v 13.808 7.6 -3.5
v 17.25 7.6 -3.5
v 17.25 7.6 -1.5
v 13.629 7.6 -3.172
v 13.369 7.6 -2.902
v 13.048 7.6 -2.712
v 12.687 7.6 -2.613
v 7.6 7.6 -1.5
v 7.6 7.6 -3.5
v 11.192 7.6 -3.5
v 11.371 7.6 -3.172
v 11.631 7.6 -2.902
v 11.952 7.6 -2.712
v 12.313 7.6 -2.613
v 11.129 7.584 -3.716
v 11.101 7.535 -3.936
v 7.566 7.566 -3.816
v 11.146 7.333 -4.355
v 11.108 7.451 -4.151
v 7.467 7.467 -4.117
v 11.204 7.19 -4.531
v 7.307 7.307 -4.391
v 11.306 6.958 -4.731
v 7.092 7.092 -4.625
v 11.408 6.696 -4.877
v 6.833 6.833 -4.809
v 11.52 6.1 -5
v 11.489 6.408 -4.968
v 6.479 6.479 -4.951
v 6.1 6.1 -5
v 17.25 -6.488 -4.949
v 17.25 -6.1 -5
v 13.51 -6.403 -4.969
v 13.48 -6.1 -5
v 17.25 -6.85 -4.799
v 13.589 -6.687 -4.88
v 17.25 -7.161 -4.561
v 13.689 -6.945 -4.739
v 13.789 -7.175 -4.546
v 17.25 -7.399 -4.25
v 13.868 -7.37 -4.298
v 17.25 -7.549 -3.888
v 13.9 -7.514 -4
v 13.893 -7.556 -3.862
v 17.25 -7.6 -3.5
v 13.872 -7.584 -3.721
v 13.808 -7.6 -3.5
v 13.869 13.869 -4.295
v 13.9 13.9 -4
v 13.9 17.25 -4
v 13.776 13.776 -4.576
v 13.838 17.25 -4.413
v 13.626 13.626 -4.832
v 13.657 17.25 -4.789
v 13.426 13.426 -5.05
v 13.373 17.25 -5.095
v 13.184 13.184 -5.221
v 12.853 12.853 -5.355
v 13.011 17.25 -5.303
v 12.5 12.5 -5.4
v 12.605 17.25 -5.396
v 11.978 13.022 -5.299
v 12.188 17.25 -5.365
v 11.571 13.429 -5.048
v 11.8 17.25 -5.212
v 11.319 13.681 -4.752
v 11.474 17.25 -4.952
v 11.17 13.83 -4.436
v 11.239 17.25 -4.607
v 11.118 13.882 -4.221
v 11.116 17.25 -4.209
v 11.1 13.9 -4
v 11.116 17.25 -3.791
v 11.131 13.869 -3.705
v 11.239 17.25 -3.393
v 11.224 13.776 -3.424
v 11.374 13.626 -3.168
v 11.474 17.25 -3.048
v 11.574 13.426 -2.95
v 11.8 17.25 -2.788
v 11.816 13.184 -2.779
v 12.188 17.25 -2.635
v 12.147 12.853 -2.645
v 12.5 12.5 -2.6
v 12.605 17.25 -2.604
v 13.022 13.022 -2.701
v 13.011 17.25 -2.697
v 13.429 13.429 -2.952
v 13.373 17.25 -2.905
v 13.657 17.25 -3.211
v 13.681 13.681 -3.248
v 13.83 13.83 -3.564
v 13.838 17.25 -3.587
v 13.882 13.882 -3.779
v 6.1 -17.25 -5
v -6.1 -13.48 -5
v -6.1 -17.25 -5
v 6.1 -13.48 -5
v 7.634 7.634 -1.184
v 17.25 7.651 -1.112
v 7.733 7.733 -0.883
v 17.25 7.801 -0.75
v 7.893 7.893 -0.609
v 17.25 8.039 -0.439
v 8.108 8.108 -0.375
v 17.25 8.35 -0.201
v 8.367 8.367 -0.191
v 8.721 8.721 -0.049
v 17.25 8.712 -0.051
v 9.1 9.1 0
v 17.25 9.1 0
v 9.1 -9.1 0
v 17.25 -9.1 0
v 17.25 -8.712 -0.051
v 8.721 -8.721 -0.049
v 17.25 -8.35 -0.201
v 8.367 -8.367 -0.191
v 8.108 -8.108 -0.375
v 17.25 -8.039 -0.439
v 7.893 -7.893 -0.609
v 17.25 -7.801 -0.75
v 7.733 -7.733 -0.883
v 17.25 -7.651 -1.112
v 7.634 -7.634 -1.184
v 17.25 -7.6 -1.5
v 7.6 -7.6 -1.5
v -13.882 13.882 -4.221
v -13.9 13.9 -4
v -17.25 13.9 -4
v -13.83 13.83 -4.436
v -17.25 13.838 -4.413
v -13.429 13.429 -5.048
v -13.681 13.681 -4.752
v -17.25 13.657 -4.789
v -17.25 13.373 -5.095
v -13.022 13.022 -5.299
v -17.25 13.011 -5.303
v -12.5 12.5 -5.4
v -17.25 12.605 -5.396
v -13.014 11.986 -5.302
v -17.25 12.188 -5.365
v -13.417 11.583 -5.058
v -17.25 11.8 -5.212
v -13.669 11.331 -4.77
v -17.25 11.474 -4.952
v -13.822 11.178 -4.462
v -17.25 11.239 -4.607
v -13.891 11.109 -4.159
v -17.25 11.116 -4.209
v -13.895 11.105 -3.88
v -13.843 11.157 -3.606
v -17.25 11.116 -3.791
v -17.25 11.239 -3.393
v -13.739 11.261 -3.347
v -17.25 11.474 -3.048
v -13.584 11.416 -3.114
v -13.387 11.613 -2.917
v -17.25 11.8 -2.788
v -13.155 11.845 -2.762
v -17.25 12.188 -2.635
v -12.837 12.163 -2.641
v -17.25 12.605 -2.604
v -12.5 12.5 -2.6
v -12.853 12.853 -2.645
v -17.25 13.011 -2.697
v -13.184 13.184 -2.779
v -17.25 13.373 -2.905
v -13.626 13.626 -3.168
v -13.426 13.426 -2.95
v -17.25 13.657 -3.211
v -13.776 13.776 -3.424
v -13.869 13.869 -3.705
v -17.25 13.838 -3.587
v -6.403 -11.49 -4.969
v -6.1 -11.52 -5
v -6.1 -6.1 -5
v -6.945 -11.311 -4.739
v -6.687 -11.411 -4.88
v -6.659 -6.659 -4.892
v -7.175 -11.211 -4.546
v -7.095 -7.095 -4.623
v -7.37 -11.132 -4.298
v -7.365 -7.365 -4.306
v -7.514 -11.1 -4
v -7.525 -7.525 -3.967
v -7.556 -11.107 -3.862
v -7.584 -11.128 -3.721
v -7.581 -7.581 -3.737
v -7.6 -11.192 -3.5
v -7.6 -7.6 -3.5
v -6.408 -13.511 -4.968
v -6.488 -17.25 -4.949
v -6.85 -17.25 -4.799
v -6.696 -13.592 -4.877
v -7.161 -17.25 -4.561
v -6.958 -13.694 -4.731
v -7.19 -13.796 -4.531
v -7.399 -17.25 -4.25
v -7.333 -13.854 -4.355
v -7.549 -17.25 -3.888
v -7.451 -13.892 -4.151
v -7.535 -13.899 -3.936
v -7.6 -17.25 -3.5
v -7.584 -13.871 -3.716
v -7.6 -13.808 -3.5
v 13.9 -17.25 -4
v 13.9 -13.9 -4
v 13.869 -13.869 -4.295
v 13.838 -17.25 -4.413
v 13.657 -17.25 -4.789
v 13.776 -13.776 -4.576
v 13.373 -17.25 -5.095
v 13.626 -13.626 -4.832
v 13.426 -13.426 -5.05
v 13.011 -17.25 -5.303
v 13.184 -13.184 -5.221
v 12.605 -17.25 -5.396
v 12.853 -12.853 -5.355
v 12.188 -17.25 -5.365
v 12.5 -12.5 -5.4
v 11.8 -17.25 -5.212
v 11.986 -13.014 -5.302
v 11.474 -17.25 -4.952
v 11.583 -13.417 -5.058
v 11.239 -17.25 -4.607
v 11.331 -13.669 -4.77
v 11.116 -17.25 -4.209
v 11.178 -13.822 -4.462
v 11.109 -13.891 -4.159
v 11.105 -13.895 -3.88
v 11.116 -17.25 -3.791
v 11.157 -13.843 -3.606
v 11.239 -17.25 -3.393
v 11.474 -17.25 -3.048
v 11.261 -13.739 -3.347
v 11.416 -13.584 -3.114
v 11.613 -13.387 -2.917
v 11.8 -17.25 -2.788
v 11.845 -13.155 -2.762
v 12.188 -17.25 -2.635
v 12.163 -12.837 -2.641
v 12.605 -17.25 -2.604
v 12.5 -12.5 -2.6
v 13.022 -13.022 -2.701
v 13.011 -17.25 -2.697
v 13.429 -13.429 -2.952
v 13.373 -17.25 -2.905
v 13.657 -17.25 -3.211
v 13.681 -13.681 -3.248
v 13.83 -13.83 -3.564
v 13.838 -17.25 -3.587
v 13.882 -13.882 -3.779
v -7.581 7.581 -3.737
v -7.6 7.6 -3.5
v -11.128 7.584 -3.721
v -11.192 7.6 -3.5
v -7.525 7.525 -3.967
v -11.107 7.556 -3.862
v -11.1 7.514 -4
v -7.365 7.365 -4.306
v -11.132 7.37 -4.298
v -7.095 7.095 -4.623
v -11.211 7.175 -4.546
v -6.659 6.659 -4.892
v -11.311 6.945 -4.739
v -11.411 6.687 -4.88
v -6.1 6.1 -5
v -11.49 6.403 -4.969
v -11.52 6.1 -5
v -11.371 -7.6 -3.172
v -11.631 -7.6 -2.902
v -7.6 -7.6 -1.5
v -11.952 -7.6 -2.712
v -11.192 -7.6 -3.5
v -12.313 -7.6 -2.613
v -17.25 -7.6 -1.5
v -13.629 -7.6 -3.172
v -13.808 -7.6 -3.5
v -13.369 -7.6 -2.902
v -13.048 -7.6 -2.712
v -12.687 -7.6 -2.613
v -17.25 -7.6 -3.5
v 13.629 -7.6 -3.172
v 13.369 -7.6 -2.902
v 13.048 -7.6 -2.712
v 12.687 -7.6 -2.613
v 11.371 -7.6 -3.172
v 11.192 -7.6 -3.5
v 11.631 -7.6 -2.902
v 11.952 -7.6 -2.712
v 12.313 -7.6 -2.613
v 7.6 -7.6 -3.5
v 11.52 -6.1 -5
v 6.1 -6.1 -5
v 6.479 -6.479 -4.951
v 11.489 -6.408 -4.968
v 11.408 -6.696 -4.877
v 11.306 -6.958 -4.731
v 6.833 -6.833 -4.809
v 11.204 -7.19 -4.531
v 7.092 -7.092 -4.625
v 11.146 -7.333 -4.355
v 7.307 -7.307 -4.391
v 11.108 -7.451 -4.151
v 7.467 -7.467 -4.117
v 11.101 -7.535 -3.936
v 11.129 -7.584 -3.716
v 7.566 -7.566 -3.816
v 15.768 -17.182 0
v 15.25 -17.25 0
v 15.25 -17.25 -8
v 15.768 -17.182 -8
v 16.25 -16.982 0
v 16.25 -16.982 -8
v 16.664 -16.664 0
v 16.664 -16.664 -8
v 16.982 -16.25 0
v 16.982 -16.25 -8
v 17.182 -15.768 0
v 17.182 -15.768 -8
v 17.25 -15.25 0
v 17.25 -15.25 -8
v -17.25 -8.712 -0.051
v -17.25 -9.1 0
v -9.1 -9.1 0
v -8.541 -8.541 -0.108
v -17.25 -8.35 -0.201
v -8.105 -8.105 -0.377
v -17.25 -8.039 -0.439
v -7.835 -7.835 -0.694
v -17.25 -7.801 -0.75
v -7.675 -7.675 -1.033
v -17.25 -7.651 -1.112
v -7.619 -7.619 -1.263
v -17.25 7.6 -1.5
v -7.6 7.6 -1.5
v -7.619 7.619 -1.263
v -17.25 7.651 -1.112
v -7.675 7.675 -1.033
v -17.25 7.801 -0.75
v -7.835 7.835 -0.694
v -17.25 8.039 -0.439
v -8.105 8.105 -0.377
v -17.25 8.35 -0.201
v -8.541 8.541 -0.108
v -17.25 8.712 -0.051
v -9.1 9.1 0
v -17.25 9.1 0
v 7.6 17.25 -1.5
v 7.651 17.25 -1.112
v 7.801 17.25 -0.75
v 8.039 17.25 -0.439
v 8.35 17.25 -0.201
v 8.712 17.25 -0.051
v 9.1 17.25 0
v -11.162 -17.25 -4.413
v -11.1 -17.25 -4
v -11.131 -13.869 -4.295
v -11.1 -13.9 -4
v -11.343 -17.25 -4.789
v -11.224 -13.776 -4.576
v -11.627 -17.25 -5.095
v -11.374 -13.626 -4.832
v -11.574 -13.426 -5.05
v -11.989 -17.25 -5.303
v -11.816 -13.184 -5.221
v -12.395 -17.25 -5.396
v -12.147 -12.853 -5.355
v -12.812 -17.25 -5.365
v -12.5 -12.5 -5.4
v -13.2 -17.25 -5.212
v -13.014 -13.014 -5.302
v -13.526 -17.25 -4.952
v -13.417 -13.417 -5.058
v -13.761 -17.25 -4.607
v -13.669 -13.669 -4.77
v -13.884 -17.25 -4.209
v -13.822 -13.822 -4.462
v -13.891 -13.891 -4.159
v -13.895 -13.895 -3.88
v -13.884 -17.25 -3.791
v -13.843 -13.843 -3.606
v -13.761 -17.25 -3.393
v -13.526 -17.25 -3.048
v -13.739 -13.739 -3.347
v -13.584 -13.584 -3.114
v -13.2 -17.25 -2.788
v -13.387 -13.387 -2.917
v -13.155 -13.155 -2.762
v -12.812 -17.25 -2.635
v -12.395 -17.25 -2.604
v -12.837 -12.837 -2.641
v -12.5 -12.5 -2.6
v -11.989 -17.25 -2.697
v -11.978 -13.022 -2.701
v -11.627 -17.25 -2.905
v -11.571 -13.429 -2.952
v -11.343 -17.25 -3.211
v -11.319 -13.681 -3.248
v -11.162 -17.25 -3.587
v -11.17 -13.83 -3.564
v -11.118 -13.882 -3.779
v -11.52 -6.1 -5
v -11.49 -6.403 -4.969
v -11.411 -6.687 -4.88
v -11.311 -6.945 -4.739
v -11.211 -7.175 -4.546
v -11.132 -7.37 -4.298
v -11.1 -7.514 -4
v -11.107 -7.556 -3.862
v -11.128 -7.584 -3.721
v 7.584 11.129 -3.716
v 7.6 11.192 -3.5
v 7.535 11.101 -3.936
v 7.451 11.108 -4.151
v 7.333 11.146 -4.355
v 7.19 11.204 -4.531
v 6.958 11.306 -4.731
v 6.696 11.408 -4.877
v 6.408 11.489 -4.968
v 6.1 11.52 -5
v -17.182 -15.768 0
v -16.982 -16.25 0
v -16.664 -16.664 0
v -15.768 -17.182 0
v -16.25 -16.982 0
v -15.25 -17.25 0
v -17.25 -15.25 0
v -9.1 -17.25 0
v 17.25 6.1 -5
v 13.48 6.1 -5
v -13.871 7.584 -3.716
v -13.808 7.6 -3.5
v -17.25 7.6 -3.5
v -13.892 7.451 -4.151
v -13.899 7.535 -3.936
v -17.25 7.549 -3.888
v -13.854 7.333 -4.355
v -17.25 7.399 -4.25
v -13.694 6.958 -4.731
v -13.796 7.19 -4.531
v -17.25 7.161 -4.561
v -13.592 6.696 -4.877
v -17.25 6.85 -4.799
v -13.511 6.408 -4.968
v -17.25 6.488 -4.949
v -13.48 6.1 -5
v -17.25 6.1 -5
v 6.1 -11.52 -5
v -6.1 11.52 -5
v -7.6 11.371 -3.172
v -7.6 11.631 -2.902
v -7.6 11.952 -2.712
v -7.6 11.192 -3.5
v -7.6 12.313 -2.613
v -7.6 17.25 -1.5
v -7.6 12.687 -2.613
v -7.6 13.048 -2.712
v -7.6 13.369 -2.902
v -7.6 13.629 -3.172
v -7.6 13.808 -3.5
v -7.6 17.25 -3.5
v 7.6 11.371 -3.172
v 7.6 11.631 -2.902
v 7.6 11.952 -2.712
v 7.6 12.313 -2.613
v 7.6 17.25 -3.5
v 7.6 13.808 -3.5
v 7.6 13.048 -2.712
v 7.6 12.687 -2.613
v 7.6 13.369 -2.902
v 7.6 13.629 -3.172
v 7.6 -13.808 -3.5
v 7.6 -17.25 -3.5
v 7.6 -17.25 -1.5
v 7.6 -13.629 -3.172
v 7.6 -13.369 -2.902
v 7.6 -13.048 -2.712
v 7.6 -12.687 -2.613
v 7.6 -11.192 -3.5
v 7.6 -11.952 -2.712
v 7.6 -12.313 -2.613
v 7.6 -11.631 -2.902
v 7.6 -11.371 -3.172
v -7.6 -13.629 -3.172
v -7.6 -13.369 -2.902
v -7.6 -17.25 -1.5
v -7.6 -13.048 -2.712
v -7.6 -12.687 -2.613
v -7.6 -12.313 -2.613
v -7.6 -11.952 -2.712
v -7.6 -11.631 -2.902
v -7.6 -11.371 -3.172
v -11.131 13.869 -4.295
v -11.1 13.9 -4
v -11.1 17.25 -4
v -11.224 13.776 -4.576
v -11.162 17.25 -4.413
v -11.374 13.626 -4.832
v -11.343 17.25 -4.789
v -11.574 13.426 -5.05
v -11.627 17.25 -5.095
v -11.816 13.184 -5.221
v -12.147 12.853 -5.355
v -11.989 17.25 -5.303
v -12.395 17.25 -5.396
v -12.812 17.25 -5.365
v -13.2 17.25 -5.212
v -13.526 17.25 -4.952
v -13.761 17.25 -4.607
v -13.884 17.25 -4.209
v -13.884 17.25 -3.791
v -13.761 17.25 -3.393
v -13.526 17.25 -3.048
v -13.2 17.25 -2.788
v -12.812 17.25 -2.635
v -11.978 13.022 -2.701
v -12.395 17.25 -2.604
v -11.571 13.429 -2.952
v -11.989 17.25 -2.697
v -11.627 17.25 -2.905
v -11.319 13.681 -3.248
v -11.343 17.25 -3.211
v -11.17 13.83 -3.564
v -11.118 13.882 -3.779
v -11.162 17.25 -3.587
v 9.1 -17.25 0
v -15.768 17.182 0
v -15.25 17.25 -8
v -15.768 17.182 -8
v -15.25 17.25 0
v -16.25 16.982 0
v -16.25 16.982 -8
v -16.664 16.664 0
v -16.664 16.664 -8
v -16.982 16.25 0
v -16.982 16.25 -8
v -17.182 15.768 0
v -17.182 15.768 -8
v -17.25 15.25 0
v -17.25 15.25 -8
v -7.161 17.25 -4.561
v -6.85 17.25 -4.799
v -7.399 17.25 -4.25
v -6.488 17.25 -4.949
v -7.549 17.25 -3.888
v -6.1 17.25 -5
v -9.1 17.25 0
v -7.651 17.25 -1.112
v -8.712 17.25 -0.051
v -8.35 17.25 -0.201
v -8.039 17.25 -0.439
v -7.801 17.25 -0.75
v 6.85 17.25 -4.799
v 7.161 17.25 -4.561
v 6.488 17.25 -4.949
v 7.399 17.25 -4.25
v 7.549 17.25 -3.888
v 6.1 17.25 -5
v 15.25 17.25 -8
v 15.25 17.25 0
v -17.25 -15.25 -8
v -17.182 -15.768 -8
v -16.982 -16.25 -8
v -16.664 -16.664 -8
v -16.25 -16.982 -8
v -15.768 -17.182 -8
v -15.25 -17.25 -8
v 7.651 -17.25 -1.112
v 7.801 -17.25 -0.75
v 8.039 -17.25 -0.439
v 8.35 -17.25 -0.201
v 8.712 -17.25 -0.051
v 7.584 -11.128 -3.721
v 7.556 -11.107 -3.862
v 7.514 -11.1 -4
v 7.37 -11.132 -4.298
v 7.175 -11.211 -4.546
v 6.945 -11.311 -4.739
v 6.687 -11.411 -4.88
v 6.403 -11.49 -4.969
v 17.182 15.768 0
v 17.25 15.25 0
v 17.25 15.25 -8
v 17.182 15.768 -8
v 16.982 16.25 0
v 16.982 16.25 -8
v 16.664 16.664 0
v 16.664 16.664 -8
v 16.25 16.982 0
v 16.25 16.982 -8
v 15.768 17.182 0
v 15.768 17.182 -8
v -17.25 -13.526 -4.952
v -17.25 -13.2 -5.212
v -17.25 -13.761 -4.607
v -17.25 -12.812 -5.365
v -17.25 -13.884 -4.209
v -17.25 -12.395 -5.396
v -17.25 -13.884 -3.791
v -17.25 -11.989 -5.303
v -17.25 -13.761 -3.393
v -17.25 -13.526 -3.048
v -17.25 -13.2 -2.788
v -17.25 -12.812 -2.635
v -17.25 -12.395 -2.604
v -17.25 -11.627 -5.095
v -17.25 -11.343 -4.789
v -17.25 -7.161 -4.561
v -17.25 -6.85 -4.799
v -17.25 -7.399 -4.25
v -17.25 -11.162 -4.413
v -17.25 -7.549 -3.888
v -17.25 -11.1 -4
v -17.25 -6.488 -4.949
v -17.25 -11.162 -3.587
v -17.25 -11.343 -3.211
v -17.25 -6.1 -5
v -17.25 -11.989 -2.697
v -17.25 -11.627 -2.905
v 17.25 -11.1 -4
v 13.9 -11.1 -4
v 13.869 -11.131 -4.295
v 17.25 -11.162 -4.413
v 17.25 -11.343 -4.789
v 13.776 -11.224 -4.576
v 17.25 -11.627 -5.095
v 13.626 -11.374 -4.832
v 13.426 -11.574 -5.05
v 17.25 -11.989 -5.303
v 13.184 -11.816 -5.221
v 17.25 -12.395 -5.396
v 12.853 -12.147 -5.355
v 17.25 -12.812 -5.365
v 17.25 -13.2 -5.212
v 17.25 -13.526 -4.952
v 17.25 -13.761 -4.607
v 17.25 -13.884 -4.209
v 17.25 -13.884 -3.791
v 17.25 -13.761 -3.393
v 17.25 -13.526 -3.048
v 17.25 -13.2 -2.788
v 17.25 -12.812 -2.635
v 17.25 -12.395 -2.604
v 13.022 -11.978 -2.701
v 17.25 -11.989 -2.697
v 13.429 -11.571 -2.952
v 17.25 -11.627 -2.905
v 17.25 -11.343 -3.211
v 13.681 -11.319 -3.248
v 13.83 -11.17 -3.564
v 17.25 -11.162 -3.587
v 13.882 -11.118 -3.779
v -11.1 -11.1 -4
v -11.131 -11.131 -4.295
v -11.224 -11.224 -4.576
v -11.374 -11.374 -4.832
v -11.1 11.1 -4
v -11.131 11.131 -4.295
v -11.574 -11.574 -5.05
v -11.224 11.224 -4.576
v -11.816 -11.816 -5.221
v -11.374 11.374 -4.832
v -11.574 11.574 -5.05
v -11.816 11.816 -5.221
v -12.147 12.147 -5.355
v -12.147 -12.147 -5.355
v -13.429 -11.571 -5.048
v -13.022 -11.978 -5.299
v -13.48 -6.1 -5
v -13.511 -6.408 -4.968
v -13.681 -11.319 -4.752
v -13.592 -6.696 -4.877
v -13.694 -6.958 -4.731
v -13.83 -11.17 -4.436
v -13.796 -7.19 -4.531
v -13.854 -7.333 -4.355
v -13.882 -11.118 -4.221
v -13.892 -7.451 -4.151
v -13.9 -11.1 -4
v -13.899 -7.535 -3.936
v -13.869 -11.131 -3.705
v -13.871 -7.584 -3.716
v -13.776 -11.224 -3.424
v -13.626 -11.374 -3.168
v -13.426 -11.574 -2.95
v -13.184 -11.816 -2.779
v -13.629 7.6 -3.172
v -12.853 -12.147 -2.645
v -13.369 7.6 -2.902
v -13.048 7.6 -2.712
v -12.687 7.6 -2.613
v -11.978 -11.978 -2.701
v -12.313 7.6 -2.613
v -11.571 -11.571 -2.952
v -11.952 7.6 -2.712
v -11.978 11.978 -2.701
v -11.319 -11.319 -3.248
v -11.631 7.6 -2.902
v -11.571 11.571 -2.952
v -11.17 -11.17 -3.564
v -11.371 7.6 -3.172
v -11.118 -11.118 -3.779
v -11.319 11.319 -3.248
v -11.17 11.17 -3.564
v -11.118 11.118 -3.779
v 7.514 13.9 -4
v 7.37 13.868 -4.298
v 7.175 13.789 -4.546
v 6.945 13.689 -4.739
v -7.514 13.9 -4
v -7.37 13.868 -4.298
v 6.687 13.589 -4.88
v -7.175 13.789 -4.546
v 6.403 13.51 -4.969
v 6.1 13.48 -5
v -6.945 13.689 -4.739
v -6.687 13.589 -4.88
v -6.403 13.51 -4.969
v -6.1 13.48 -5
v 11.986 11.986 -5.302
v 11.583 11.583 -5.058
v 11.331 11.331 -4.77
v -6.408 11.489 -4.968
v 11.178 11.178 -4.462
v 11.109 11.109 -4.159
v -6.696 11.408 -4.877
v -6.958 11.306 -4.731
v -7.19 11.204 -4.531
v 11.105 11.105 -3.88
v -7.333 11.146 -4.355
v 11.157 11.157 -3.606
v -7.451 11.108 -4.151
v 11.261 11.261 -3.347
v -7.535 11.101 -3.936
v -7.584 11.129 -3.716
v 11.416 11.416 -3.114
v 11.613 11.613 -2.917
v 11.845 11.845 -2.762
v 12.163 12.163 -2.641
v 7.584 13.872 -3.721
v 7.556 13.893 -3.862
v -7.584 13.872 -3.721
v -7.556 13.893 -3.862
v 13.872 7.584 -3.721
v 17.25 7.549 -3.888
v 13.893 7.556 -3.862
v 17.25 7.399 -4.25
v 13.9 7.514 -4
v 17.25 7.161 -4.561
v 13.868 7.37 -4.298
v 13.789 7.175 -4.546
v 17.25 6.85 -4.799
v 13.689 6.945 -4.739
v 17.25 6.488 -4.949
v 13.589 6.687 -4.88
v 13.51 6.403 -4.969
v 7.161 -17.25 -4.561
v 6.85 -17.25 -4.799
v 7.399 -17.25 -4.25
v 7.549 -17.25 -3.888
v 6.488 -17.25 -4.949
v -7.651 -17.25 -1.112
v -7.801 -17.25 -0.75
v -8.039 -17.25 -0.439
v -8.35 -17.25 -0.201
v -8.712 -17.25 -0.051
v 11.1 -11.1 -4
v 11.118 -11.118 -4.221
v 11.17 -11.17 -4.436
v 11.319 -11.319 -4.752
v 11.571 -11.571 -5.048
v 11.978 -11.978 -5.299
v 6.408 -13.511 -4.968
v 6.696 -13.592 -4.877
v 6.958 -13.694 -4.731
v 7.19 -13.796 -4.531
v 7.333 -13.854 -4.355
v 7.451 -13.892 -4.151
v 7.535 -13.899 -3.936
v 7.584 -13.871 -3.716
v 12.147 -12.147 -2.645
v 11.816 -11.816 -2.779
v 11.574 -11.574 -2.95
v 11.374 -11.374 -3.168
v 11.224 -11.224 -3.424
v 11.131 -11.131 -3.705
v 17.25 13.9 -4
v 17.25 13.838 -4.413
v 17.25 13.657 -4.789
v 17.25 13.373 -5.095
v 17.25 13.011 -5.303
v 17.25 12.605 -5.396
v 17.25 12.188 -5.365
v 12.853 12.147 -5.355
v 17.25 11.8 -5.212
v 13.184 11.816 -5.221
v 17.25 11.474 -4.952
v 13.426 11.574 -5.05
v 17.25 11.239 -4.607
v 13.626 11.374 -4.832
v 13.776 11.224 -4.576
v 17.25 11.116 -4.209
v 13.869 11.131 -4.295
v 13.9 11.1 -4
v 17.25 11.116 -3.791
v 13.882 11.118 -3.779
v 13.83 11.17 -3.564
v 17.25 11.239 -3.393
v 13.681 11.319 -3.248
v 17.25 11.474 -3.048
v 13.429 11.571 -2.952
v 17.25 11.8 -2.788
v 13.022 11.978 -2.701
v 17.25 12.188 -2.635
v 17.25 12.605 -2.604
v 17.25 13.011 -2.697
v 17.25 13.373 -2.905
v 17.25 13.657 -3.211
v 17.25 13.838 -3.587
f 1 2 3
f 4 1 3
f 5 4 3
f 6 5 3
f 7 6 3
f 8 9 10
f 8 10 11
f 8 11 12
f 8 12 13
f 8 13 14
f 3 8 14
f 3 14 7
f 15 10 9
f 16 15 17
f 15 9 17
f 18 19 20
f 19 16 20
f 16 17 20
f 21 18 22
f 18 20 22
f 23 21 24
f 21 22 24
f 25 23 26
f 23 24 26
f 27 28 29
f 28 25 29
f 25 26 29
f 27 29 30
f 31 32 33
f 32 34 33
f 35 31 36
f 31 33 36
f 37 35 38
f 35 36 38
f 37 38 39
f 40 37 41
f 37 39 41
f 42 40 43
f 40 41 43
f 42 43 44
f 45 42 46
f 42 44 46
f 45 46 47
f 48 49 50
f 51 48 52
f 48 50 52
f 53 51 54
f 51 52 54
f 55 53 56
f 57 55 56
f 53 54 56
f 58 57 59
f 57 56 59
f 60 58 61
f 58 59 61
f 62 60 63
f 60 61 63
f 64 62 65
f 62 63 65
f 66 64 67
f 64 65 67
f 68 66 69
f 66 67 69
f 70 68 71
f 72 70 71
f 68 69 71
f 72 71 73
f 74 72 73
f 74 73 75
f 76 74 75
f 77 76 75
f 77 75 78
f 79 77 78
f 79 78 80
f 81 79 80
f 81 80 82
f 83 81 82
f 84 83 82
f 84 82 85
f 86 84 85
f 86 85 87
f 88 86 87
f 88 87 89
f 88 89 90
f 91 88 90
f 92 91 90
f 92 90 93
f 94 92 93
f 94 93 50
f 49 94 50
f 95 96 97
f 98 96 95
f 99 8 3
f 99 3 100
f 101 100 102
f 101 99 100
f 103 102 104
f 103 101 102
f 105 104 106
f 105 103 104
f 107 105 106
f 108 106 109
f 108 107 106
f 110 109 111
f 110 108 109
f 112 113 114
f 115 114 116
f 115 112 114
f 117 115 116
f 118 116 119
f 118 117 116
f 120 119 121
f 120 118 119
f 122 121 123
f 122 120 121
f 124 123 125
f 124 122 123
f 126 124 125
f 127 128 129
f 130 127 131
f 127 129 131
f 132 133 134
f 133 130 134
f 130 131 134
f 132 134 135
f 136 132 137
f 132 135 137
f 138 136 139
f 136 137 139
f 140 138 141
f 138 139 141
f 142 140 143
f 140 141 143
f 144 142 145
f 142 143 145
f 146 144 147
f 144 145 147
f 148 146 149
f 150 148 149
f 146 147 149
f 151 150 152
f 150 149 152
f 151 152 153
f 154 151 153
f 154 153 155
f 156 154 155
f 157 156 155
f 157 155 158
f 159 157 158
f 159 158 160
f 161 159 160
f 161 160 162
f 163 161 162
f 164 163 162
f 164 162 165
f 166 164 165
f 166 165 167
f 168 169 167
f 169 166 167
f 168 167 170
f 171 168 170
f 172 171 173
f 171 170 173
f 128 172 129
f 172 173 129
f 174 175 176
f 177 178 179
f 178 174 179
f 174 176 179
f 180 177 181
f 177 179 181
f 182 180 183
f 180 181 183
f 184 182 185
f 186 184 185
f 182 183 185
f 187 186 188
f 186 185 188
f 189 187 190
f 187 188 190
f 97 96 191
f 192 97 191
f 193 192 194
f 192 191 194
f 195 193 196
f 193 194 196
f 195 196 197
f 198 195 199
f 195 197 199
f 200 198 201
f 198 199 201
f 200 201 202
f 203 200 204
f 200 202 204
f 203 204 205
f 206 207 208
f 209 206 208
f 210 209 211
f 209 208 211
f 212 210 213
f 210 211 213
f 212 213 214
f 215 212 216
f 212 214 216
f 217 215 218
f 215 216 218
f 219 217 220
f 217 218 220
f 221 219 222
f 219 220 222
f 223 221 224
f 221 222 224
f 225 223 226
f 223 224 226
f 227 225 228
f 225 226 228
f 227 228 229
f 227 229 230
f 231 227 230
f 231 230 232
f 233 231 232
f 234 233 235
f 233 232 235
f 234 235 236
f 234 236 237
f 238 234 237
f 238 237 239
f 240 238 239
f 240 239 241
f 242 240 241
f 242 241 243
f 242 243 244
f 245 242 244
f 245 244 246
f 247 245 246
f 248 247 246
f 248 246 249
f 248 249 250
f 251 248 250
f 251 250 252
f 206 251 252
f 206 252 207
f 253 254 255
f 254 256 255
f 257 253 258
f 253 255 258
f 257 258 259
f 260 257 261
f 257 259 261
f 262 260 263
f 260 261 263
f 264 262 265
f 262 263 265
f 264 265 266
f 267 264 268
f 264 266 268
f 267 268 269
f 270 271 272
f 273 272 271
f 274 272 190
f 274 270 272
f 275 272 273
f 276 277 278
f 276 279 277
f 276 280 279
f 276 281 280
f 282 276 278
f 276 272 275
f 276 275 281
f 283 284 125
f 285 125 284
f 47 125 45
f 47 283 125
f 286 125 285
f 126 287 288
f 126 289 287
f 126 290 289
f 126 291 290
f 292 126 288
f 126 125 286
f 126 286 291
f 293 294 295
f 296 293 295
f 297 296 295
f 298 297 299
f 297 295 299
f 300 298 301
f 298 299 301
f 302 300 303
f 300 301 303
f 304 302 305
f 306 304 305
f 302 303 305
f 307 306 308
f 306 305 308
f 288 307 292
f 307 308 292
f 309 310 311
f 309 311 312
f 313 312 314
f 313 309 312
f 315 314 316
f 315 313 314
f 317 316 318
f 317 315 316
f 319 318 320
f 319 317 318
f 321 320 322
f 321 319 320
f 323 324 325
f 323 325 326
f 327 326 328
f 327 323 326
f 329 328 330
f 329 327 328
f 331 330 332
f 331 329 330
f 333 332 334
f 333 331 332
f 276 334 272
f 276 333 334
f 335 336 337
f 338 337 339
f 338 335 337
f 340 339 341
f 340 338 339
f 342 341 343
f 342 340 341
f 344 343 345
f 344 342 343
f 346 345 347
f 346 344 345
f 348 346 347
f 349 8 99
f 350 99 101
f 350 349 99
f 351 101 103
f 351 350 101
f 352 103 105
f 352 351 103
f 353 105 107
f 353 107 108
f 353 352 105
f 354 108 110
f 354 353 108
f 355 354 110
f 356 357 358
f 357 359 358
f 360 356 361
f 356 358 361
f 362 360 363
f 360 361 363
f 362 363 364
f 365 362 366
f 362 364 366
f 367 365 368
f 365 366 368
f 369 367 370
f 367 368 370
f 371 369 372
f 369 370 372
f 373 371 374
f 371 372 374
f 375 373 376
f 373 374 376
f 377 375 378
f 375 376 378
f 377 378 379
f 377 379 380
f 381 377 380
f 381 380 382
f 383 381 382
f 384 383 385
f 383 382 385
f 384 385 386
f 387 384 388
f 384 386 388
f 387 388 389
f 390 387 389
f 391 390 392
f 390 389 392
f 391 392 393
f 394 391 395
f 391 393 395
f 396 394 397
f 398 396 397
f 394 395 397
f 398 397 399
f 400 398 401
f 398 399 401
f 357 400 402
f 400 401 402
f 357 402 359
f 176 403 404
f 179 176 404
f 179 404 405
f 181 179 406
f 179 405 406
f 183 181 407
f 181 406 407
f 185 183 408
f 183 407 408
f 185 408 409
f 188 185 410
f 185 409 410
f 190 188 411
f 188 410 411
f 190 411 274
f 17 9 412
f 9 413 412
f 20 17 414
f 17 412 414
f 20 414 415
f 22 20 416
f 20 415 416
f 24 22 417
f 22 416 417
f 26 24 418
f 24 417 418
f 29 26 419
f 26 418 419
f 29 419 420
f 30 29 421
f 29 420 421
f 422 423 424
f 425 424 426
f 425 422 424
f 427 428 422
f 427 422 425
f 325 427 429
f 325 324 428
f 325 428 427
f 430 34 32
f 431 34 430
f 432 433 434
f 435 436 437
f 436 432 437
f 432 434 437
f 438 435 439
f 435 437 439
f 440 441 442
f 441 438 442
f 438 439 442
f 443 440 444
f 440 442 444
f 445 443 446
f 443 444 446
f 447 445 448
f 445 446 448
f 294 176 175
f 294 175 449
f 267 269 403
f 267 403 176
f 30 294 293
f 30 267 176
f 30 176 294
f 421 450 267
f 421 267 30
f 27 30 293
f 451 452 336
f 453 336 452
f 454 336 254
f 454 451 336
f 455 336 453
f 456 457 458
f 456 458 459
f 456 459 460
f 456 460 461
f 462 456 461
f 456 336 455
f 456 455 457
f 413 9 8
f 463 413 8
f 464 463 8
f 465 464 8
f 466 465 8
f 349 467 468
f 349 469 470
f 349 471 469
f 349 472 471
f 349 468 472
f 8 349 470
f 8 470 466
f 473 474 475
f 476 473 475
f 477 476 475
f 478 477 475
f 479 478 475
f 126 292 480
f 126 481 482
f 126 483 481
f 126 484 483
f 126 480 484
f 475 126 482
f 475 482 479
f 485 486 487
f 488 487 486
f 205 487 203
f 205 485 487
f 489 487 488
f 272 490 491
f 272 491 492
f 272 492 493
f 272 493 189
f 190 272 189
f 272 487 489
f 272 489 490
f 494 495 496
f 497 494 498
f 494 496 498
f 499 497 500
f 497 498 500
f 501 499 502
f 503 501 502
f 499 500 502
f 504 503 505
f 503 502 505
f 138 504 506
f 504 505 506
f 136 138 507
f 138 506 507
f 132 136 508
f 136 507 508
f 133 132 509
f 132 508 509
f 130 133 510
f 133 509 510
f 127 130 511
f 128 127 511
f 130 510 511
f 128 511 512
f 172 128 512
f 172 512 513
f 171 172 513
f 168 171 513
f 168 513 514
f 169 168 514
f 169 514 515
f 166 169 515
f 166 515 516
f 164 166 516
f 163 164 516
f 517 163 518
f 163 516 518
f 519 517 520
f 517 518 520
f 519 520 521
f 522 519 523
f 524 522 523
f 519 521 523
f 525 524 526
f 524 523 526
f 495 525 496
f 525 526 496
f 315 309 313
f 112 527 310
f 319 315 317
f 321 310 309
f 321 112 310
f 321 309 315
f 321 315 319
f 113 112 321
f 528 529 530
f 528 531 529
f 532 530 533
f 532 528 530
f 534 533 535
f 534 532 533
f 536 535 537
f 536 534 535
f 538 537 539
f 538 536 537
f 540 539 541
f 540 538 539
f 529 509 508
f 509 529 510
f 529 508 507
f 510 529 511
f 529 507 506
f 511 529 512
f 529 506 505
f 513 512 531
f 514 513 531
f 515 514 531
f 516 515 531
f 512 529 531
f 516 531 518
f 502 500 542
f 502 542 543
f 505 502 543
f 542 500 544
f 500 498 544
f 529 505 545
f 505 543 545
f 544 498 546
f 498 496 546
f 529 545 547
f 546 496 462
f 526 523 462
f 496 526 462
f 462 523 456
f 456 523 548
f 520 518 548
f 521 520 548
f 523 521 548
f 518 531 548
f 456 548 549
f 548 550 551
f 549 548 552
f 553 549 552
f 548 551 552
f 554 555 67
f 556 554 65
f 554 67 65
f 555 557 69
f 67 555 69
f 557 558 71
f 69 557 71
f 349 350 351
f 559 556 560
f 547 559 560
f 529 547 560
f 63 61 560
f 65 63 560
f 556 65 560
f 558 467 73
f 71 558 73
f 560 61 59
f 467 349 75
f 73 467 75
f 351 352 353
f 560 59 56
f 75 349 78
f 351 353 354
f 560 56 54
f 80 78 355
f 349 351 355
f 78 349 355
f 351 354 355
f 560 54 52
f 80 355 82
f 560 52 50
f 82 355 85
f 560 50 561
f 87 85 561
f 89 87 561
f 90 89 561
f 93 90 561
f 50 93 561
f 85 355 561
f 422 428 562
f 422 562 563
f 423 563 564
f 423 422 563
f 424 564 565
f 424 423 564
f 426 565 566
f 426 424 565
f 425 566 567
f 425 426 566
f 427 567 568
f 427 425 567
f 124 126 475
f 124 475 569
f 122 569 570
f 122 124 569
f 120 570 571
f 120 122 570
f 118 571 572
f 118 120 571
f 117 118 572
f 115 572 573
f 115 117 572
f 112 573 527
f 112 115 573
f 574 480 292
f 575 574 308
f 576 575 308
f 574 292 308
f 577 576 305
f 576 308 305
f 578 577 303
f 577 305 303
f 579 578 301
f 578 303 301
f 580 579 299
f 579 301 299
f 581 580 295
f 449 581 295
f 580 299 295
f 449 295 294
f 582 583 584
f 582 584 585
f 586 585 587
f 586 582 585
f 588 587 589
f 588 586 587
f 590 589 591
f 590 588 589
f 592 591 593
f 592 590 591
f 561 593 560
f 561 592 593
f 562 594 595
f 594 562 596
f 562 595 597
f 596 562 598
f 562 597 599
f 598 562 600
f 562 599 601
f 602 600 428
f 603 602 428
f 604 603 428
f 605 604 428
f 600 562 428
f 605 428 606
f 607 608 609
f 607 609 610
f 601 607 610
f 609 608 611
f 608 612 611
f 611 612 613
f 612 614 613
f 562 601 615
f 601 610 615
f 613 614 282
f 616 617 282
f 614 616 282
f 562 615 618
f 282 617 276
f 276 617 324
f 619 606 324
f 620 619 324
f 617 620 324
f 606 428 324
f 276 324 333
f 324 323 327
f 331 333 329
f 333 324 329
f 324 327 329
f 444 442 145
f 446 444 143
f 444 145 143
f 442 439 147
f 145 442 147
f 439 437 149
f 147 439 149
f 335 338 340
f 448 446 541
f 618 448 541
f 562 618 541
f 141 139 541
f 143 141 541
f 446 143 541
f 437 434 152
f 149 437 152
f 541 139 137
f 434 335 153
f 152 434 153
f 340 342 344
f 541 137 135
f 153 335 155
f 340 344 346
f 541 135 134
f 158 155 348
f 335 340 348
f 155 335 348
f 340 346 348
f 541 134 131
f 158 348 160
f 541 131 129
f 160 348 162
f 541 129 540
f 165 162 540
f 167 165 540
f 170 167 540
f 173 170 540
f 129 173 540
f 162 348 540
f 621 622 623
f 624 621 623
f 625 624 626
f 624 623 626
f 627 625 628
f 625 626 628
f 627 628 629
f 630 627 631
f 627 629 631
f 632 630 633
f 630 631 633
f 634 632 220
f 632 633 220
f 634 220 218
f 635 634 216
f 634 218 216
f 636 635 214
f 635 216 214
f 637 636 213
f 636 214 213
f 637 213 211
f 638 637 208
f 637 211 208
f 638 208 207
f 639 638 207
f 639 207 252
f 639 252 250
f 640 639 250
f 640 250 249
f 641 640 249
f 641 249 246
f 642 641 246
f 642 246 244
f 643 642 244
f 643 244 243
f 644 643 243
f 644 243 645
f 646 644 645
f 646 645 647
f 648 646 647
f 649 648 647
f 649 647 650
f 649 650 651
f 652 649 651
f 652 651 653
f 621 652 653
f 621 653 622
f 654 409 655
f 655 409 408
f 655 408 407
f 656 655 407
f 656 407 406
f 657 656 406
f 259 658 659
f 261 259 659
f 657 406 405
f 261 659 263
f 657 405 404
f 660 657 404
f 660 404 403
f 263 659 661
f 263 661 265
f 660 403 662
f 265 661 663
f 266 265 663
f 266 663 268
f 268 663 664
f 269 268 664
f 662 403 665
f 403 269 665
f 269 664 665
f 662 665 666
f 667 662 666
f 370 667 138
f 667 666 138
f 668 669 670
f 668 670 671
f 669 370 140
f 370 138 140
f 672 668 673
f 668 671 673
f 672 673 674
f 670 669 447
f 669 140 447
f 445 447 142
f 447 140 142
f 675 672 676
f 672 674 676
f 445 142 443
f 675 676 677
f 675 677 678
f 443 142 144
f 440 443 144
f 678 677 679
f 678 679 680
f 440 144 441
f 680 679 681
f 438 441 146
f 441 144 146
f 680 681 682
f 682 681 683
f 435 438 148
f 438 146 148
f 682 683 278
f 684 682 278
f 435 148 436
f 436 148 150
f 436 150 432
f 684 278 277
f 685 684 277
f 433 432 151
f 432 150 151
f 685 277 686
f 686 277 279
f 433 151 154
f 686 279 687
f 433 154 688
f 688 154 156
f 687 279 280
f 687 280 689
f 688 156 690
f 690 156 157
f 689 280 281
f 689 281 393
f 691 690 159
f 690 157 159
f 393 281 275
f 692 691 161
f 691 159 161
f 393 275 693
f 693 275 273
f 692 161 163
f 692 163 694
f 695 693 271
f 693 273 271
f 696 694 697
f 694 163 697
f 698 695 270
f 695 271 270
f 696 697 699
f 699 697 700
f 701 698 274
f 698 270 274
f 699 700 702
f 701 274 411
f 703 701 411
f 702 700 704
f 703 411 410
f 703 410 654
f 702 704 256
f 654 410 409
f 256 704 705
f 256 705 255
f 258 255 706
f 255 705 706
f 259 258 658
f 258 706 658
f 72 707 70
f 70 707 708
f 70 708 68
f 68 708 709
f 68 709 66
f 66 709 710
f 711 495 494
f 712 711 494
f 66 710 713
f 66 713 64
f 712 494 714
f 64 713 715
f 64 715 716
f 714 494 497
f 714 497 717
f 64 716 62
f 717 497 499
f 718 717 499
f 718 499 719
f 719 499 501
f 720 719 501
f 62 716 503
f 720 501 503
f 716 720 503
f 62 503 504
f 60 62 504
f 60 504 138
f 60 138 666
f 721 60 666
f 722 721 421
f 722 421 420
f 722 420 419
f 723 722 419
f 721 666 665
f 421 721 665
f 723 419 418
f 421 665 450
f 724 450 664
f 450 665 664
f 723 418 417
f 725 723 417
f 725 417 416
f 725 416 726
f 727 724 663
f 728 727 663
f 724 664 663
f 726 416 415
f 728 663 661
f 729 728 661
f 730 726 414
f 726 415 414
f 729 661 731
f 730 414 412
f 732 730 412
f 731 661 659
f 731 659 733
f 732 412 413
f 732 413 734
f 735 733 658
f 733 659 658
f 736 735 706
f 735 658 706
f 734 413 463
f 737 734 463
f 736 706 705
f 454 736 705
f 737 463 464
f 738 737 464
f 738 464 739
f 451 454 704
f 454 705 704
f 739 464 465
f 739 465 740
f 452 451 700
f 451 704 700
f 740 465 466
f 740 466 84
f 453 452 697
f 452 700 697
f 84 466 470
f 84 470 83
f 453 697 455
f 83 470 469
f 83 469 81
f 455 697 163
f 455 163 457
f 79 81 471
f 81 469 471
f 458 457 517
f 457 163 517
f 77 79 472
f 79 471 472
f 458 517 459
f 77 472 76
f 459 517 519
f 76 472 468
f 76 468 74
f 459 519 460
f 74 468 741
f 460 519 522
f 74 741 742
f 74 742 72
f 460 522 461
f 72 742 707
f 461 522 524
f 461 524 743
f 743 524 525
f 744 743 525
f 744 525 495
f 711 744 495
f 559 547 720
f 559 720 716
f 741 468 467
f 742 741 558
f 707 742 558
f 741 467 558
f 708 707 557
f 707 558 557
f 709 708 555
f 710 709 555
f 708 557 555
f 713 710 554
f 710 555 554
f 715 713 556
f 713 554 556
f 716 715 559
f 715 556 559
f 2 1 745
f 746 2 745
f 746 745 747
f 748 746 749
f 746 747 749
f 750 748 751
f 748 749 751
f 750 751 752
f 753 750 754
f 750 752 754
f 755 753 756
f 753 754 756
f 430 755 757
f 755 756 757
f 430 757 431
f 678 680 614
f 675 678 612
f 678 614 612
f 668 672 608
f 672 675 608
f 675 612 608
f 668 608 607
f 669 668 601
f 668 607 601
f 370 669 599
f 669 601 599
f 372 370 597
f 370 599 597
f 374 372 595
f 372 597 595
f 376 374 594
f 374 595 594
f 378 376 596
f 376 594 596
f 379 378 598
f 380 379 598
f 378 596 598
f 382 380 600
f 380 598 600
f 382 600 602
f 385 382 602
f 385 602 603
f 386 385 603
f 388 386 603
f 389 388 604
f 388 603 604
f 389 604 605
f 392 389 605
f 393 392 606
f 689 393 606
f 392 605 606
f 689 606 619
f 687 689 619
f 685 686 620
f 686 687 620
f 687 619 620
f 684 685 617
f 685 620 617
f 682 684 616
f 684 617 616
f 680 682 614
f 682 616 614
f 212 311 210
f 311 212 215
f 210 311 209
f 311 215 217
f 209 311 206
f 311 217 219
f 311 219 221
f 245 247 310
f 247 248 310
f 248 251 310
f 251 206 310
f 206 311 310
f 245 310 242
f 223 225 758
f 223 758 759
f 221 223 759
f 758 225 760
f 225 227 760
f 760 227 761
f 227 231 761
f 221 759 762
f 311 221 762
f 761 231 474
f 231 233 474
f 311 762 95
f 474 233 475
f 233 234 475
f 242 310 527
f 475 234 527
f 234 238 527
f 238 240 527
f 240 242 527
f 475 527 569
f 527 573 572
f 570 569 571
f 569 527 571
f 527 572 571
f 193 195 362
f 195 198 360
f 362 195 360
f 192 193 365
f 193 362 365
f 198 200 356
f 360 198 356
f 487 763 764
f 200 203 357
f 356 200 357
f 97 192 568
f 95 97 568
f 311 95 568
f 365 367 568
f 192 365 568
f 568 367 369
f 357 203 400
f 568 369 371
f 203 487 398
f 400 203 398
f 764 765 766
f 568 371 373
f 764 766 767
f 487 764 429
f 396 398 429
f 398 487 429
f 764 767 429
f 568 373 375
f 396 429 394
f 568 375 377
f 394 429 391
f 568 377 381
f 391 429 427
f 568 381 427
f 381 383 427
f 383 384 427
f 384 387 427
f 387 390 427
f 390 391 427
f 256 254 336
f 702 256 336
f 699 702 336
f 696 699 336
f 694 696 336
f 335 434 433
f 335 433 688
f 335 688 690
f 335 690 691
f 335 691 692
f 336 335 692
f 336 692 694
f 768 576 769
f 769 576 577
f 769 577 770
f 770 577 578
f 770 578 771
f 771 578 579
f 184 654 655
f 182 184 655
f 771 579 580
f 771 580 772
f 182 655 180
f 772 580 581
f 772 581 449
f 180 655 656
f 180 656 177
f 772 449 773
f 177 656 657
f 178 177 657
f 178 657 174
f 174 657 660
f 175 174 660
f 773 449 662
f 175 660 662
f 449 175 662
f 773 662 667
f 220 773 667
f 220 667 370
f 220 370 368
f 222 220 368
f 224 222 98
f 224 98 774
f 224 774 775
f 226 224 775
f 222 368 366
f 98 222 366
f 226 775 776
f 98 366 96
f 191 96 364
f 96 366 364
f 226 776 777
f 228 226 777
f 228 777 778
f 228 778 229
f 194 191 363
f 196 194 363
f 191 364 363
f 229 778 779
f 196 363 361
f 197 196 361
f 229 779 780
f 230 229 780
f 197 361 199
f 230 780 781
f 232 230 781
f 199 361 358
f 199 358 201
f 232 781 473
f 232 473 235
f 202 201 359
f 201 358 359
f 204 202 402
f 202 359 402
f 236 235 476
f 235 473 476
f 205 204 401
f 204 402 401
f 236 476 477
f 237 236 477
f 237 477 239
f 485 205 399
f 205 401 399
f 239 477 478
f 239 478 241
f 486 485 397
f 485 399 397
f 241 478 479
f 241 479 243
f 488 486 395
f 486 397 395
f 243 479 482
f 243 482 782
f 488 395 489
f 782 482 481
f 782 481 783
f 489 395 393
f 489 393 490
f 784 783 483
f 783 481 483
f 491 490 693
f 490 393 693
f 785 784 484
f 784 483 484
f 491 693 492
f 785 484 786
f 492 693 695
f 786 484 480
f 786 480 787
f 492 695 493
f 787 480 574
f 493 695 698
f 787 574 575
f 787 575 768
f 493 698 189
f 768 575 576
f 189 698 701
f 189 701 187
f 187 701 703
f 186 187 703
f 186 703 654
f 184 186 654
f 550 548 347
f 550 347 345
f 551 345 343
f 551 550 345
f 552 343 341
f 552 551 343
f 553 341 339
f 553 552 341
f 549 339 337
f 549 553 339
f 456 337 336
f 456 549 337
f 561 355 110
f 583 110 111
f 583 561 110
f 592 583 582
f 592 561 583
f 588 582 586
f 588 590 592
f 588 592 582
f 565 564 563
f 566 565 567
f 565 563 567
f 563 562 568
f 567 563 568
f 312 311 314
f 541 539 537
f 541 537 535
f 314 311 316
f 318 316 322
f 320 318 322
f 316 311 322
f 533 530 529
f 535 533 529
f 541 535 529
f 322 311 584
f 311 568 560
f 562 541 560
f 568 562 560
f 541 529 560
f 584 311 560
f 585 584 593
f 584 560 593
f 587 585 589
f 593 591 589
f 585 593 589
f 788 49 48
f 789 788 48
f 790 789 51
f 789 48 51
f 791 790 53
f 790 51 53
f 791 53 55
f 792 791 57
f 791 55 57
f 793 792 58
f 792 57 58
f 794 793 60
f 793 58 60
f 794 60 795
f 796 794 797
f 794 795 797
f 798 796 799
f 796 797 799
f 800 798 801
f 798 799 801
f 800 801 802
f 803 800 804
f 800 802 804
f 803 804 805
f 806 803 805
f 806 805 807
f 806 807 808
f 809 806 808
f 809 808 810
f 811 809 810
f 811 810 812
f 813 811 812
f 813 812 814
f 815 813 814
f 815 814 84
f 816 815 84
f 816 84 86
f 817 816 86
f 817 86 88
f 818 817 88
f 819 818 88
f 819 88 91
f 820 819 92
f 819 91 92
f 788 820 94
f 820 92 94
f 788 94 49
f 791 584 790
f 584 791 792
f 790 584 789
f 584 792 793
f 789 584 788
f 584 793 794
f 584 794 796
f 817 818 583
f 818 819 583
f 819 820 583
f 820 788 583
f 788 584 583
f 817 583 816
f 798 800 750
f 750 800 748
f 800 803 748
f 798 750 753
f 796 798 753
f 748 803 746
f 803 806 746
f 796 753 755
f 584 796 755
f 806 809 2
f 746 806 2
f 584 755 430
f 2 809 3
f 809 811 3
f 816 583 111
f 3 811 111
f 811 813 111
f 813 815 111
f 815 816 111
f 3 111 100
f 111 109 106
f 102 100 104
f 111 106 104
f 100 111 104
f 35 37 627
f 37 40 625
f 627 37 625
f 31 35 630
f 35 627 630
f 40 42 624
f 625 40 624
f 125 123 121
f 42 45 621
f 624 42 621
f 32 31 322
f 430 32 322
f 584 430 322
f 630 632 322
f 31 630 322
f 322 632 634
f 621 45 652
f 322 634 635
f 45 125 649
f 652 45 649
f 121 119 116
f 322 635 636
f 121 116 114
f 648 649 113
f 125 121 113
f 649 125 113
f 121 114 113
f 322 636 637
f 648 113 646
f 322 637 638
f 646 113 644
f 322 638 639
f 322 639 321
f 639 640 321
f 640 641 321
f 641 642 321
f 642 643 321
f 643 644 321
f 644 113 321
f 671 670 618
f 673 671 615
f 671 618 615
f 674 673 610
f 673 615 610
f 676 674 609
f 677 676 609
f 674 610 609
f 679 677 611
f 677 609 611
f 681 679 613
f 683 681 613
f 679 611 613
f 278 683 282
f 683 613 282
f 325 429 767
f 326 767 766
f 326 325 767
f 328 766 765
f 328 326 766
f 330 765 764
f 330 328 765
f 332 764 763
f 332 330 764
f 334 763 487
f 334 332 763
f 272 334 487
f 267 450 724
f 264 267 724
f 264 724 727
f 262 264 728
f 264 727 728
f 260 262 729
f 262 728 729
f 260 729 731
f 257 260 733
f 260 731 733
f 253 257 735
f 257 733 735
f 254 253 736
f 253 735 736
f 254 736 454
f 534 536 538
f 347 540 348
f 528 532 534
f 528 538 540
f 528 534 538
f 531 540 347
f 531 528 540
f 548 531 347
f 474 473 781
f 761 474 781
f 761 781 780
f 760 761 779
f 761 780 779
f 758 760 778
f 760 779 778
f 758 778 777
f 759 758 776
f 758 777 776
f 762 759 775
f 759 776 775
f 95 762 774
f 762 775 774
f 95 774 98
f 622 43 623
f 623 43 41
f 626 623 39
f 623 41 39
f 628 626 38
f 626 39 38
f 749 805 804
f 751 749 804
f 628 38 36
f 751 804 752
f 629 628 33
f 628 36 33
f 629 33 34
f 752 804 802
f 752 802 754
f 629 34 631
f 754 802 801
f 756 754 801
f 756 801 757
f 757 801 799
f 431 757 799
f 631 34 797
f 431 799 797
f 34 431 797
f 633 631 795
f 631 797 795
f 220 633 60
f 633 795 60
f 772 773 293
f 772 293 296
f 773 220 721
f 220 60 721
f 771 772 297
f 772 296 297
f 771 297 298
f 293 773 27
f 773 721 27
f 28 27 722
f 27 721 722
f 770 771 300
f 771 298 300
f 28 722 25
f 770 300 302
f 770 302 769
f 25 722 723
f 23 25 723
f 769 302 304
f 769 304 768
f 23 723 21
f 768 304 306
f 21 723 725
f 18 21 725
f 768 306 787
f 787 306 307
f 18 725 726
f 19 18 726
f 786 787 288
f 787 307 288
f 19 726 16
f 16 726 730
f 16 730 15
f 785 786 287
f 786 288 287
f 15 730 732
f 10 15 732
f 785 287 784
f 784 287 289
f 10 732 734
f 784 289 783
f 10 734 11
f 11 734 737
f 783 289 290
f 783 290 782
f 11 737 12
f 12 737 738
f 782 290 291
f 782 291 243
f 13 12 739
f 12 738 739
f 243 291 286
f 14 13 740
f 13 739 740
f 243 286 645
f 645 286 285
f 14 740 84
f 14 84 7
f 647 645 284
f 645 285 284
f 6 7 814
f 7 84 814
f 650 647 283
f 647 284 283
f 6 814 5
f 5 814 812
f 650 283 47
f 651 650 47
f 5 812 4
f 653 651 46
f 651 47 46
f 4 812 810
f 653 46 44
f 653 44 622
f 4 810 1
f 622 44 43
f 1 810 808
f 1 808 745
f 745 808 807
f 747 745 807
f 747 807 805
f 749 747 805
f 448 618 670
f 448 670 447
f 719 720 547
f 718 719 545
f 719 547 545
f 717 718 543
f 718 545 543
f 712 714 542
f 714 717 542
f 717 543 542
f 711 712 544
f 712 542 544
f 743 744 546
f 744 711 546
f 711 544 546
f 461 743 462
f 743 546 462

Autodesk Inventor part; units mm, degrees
ref_plane "YZ Plane" through (0, 0, 0) normal (1, 0, 0) x (0, 1, 0)
ref_plane "XZ Plane" through (0, 0, 0) normal (0, 1, 0) x (-1, 0, 0)
ref_plane "Work Plane1" through (0, 0, 0) normal (0, 0, 1) x (1, 0, 0)
sketch "Sketch1" plane through (0, 0, 0) normal (0, 0, 1) x (1, 0, 0)
  line L0 (9.1, -25) -> (9.1, -17.5) projected
  line L1 (9.1, -25) -> (25, -25) projected
  line L2 (25, -25) -> (25, -9.1) projected
  line L3 (17.5, -9.1) -> (25, -9.1) projected
  line L4 (17.5, -9.1) -> (17.5, -15.5) projected
  arc A0 (15.5, -17.5) -> (17.5, -15.5) centre (15.5, -15.5) ccw projected
  line L5 (15.5, -17.5) -> (9.1, -17.5) projected
  circle A1 centre (20, -20) radius 2.2989 projected
  arc A2 (17.5, 15.5) -> (15.5, 17.5) centre (15.5, 15.5) ccw projected
  line L6 (-15.25, 17.25) -> (15.25, 17.25)
  line L7 (17.25, 15.25) -> (17.25, -15.25)
  line L8 (15.25, -17.25) -> (-15.25, -17.25)
  line L9 (-17.25, -15.25) -> (-17.25, 15.25)
  line L10 (-17.25, 17.25) -> (17.25, -17.25) construction
  line L11 (17.25, 17.25) -> (-17.25, -17.25) construction
  arc A3 (15.25, -17.25) -> (17.25, -15.25) centre (15.25, -15.25) ccw
  arc A4 (-17.25, -15.25) -> (-15.25, -17.25) centre (-15.25, -15.25) ccw
  arc A5 (-15.25, 17.25) -> (-17.25, 15.25) centre (-15.25, 15.25) ccw
  arc A6 (17.25, 15.25) -> (15.25, 17.25) centre (15.25, 15.25) ccw
  point P0 (0, 0)
  dimension "d0" = 34.5
  dimension "d1" = 34.5
  dimension "d2" = 2
ref_plane "Work Plane2" through (-25, -25, -8) normal (0, 0, -1) x (0, 1, 0)
extrude "Extrusion1" add sketch "Sketch1" against normal up to surface (8 mm away) contours L6 A6 L7 A3 L8 A4 L9 A5
sketch "Sketch2" plane through (-15.25, 17.25, 0) normal (0, 1, 0) x (1, 0, 0)
  arc A0 (22.85, 1.5) -> (24.35, 0) centre (24.35, 1.5) ccw projected
  line L0 (40.25, 0) -> (24.35, 0) projected
  line L1 (40.25, 0) -> (40.25, 8) projected
  line L2 (18.4, 8) -> (40.25, 8) projected
  line L3 (18.4, 8) -> (18.4, 5) projected
  line L4 (18.4, 5) -> (21.35, 5) projected
  arc A1 (22.85, 3.5) -> (21.35, 5) centre (21.35, 3.5) ccw projected
  line L5 (22.85, 3.5) -> (22.85, 1.5) projected
  circle A2 centre (27.75, 4) radius 1.75 projected
  circle A3 centre (2.75, 4) radius 1.75 projected
  arc A4 (6.15, 0) -> (7.65, 1.5) centre (6.15, 1.5) ccw projected
  line L6 (7.65, 1.5) -> (7.65, 3.5) projected
  arc A5 (9.15, 5) -> (7.65, 3.5) centre (9.15, 3.5) ccw projected
  line L7 (9.15, 5) -> (12.1, 5) projected
  line L8 (12.1, 5) -> (12.1, 8) projected
  line L9 (-9.75, 8) -> (12.1, 8) projected
  line L10 (-9.75, 0) -> (-9.75, 8) projected
  line L11 (6.15, 0) -> (-9.75, 0) projected
  line L12 (18.4, 5) -> (12.1, 5)
  line L13 (12.1, 5) -> (12.1, 8)
  line L14 (12.1, 8) -> (18.4, 8)
  line L15 (18.4, 8) -> (18.4, 5)
  line L16 (24.35, 0) -> (6.15, 0)
  circle A6 centre (27.75, 4) radius 1.4
  circle A7 centre (2.75, 4) radius 1.4
  point P0 (15.25, 0)
  dimension "d7" = 2.8
  dimension "d8" = 2.8
extrude "Extrusion2" cut sketch "Sketch2" against normal through all contours A0 L16 A4 L6 A5 L7 L12 L4 A1 L5 | A6 | A7
sketch "Sketch3" plane through (-6.1, 17.25, -5) normal (0, 0, 1) x (1, 0, 0)
  circle A0 centre (6.1, -17.25) radius 4.7436
pattern_circular "Circular Pattern1" count 2 over 90 about axis through (0, 0, -5) along (0, 0, 1) of "Extrusion2"
properties part number "10_Base_v0_plate"
